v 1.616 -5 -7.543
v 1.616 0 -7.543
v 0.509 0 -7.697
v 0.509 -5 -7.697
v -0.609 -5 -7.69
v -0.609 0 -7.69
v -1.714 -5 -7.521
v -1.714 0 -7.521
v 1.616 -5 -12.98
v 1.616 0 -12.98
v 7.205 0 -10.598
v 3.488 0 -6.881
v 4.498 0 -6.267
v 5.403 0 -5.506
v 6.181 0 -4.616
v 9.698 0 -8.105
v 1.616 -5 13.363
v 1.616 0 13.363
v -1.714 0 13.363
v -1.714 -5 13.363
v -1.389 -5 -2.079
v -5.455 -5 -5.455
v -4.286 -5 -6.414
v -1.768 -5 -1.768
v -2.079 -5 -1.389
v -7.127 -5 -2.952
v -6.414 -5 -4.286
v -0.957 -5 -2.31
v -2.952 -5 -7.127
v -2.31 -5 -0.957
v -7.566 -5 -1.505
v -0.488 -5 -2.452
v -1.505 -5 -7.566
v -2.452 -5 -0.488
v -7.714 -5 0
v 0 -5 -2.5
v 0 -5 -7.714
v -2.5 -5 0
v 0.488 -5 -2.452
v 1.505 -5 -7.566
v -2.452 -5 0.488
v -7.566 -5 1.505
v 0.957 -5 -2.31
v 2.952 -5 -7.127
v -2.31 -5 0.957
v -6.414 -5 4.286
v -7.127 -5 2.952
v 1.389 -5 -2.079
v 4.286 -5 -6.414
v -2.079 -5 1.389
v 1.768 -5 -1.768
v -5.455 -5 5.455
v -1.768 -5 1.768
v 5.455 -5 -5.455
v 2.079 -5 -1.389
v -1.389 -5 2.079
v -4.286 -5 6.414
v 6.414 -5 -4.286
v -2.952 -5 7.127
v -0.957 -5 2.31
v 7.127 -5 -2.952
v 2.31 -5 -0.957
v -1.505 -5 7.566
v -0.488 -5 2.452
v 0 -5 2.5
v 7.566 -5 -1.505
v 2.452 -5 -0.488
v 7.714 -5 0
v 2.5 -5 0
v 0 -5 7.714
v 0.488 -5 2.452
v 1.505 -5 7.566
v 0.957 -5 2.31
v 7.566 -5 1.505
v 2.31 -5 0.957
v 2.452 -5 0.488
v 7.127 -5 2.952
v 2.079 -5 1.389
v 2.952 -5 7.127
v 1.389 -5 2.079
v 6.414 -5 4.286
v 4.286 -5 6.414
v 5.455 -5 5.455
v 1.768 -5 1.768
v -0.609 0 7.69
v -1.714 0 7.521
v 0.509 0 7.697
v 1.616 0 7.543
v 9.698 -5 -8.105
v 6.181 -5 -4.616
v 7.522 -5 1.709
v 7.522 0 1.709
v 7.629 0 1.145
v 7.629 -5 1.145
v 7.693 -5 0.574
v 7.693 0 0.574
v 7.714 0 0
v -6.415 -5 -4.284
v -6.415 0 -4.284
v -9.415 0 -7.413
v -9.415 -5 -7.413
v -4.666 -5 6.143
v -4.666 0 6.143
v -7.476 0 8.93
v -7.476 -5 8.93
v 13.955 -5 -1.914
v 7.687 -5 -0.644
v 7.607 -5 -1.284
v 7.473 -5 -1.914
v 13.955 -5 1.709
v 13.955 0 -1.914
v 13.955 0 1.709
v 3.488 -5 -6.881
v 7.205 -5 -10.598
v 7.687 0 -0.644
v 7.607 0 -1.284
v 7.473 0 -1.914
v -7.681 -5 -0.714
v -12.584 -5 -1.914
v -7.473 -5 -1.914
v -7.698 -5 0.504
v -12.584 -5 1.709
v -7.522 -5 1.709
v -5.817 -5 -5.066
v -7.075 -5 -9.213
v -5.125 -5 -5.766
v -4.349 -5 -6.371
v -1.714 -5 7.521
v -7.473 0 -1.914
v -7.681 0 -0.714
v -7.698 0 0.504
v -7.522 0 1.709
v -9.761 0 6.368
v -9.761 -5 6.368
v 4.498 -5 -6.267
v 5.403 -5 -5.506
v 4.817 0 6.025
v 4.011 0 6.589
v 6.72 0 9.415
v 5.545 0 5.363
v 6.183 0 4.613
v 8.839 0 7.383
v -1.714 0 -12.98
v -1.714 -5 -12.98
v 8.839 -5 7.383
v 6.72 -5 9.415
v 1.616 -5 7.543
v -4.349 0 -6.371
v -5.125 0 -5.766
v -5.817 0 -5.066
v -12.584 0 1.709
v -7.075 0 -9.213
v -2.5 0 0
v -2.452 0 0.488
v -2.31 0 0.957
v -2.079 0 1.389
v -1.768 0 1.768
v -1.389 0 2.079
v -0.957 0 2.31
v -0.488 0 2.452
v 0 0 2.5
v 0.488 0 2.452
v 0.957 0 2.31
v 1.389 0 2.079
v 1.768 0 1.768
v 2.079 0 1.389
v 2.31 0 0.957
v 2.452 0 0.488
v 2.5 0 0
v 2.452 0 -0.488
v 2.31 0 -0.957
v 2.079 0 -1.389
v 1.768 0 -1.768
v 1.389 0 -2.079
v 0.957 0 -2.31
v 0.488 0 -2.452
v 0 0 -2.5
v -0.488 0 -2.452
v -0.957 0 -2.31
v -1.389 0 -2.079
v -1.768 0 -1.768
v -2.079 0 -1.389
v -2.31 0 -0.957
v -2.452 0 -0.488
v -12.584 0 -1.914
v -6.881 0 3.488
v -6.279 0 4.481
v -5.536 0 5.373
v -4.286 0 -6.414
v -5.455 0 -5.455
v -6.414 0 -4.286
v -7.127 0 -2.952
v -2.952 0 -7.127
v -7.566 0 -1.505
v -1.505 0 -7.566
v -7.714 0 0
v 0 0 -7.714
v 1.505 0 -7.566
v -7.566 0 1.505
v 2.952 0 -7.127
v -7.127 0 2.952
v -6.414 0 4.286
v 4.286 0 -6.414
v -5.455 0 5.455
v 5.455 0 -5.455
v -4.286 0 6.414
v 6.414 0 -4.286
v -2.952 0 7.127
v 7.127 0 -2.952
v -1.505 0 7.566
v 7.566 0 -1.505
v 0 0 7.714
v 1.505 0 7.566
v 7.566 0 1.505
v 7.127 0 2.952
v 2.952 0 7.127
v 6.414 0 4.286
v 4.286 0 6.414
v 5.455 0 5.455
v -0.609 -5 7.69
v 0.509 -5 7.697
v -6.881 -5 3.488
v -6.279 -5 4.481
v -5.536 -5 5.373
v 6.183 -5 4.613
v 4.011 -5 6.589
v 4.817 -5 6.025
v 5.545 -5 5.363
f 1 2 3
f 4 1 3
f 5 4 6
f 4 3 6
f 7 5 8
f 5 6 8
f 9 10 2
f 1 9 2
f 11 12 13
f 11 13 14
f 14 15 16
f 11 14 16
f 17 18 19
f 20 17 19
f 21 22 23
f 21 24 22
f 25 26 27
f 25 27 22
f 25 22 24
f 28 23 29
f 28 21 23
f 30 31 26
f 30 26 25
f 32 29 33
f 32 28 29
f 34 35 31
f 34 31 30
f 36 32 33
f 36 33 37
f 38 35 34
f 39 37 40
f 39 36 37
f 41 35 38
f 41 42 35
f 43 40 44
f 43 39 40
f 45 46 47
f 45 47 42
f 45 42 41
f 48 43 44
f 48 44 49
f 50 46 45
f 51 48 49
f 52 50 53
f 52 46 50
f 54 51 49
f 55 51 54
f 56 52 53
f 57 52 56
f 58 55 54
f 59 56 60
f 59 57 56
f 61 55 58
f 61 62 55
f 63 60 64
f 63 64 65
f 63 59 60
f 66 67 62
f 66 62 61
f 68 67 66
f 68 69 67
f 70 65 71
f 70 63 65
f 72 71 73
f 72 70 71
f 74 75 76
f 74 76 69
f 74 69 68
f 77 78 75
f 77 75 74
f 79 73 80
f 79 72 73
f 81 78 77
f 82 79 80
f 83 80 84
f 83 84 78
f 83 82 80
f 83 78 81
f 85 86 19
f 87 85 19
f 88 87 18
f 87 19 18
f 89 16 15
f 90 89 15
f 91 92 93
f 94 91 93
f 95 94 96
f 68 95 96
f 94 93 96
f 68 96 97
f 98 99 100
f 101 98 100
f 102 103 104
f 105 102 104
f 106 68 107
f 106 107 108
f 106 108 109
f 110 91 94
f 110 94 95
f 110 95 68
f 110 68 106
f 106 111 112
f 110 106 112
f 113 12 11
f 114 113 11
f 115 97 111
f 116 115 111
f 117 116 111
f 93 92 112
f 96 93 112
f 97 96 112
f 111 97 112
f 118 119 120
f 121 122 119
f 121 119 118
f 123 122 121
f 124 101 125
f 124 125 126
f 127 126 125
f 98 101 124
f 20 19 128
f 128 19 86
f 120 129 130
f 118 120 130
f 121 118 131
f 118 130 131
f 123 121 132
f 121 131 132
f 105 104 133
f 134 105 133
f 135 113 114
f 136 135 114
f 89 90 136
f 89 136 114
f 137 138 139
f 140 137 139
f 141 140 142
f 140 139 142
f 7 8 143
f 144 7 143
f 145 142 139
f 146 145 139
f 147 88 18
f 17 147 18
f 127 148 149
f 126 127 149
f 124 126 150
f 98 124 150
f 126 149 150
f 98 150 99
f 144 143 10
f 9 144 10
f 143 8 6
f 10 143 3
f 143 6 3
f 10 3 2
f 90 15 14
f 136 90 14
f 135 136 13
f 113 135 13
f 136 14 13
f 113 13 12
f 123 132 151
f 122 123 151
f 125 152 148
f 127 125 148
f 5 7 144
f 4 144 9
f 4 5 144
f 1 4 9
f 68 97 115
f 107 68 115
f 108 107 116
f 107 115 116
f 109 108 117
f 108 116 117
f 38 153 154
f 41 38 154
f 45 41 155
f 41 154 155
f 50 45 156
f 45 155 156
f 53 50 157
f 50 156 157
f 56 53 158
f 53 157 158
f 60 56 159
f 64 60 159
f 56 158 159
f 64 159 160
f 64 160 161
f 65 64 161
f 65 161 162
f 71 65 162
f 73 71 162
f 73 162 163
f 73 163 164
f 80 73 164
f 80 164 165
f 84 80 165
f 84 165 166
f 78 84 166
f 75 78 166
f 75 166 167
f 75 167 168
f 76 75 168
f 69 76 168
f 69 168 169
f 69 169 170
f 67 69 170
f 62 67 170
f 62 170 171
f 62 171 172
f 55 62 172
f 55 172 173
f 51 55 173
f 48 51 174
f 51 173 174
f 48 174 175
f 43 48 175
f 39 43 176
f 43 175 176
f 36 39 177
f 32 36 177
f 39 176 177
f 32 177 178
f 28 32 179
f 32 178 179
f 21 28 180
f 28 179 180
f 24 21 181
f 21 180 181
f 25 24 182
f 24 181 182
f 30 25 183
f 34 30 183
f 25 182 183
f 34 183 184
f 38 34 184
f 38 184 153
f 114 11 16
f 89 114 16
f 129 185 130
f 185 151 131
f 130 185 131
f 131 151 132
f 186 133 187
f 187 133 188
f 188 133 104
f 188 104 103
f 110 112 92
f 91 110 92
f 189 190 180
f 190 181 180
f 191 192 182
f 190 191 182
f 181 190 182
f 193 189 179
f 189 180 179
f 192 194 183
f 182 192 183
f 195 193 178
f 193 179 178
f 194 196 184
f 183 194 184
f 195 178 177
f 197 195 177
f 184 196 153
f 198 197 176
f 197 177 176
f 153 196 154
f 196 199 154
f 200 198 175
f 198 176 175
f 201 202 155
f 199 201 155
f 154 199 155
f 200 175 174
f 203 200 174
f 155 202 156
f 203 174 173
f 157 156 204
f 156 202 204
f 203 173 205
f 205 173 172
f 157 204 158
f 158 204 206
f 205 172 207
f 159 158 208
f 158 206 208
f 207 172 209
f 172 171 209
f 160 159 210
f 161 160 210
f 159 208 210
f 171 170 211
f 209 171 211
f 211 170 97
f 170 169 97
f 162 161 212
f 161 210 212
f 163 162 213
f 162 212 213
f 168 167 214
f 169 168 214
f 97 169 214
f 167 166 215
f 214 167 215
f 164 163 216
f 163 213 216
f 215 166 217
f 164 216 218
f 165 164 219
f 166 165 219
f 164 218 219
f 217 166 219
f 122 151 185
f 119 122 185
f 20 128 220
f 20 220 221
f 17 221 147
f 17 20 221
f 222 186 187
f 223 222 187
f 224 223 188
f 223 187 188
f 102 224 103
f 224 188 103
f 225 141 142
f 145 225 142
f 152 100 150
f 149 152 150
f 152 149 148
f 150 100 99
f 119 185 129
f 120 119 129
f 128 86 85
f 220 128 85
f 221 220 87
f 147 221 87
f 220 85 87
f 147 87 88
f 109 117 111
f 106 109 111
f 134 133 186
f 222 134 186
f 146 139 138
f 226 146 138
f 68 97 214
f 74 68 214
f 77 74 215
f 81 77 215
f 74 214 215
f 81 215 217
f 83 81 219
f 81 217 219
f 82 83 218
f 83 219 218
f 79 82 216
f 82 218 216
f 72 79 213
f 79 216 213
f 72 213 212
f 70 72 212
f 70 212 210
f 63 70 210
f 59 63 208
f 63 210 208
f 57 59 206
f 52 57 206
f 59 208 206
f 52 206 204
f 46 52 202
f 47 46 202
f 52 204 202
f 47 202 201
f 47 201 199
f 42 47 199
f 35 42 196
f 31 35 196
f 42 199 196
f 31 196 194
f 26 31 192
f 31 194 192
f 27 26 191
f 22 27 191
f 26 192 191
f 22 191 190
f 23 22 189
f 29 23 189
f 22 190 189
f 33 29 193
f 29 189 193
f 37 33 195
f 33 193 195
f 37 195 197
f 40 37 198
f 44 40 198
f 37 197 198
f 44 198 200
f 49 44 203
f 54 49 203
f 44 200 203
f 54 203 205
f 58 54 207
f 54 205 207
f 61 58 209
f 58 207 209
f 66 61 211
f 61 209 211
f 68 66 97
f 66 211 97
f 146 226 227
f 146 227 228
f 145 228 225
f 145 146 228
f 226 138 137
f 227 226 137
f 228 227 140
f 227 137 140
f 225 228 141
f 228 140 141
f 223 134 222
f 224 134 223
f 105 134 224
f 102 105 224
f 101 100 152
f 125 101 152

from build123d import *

# Parameters (mm, degrees)
F0_R     = 7.7142389087
F5_DEPTH = 5
F7_D     = 5


with BuildPart() as f5:
    # F0 (on Front) → F5 (new body)
    with BuildSketch(Plane.XZ):
        Circle(F0_R)
    extrude(amount=F5_DEPTH)

    # F7 (through all)
    with Locations(Plane.XZ.offset(5)):
        with Locations((0, 0)):
            Hole(F7_D / 2)


with BuildPart() as f5b:
    # F4 (on face) → F5, piece 2 (new body)
    with BuildSketch(Plane.XZ):
        with BuildLine():
            Line((-6.4151013281, -4.2843852407), (-9.4147128984, -7.4127353728))
            Line((-9.4147128984, -7.4127353728), (-7.0748222597, -9.2134878601))
            Line((-7.0748222597, -9.2134878601), (-4.349461512, -6.3711589602))
            ThreePointArc((-4.349461512, -6.3711589602), (-5.4824820495, -5.4269579431), (-6.4151013281, -4.2843852407))
        make_face()
    extrude(amount=F5_DEPTH)


with BuildPart() as f5c:
    # F4 (on face) → F5, piece 3 (new body)
    with BuildSketch(Plane.XZ):
        with BuildLine():
            Line((6.7200716585, 9.4145284966), (4.0111821729, 6.5893777791))
            ThreePointArc((4.0111821729, 6.5893777791), (5.191915124, 5.7055673938), (6.1828679139, 4.6132013071))
            Line((6.1828679139, 4.6132013071), (8.838734437, 7.3830534008))
            Line((8.838734437, 7.3830534008), (6.7200716585, 9.4145284966))
        make_face()
    extrude(amount=F5_DEPTH)


with BuildPart() as f5d:
    # F2 (on face) → F5, piece 4 (new body)
    with BuildSketch(Plane.XZ):
        with BuildLine():
            Line((-7.5224605391, 1.7094061477), (-12.5843221322, 1.7094061477))
            Line((-12.5843221322, 1.7094061477), (-12.5843221322, -1.9140576478))
            Line((-12.5843221322, -1.9140576478), (-7.4730091169, -1.9140576478))
            ThreePointArc((-7.4730091169, -1.9140576478), (-7.7135205983, -0.1052706983), (-7.5224605391, 1.7094061477))
        make_face()
    extrude(amount=F5_DEPTH)


with BuildPart() as f5e:
    # F2 (on face) → F5, piece 5 (new body)
    with BuildSketch(Plane.XZ):
        with BuildLine():
            Line((13.9551013708, 1.7094061477), (7.5224605391, 1.7094061477))
            ThreePointArc((7.5224605391, 1.7094061477), (7.6661443934, 0.8600651604), (7.7142389087, 0))
            ThreePointArc((7.7142389087, 0), (7.6536938675, -0.9645994624), (7.4730091169, -1.9140576478))
            Line((7.4730091169, -1.9140576478), (13.9551013708, -1.9140576478))
            Line((13.9551013708, -1.9140576478), (13.9551013708, 1.7094061477))
        make_face()
    extrude(amount=F5_DEPTH)


with BuildPart() as f5f:
    # F3 (on face) → F5, piece 6 (new body)
    with BuildSketch(Plane.XZ):
        with BuildLine():
            Line((-7.475768216, 8.9297927916), (-9.7609516233, 6.3676163554))
            Line((-9.7609516233, 6.3676163554), (-6.8808801981, 3.4875449302))
            ThreePointArc((-6.8808801981, 3.4875449302), (-5.9242567565, 4.9409173059), (-4.6662492185, 6.1429309105))
            Line((-4.6662492185, 6.1429309105), (-7.475768216, 8.9297927916))
        make_face()
    extrude(amount=F5_DEPTH)


with BuildPart() as f5g:
    # F3 (on face) → F5, piece 7 (new body)
    with BuildSketch(Plane.XZ):
        with BuildLine():
            ThreePointArc((6.1805118227, -4.6163573898), (4.9648611492, -5.9042049176), (3.4875449302, -6.8808801981))
            Line((3.4875449302, -6.8808801981), (7.2048073635, -10.5981426314))
            Line((7.2048073635, -10.5981426314), (9.6977343783, -8.1052156165))
            Line((9.6977343783, -8.1052156165), (6.1805118227, -4.6163573898))
        make_face()
    extrude(amount=F5_DEPTH)


with BuildPart() as f5h:
    # F1 (on face) → F5, piece 8 (new body)
    with BuildSketch(Plane.XZ):
        with BuildLine():
            Line((1.6157386126, 13.3632495999), (-1.7139305128, 13.3632495999))
            Line((-1.7139305128, 13.3632495999), (-1.7139305128, 7.52143099))
            ThreePointArc((-1.7139305128, 7.52143099), (-0.0502808867, 7.7140750432), (1.6157386126, 7.5431340089))
            Line((1.6157386126, 7.5431340089), (1.6157386126, 13.3632495999))
        make_face()
    extrude(amount=F5_DEPTH)


with BuildPart() as f5i:
    # F1 (on face) → F5, piece 9 (new body)
    with BuildSketch(Plane.XZ):
        with BuildLine():
            ThreePointArc((1.6157386126, -7.5431340089), (-0.0502808867, -7.7140750432), (-1.7139305128, -7.52143099))
            Line((-1.7139305128, -7.52143099), (-1.7139305128, -12.980312109))
            Line((-1.7139305128, -12.980312109), (1.6157386126, -12.980312109))
            Line((1.6157386126, -12.980312109), (1.6157386126, -7.5431340089))
        make_face()
    extrude(amount=F5_DEPTH)


solid = Compound([f5.part, f5b.part, f5c.part, f5d.part, f5e.part, f5f.part, f5g.part, f5h.part, f5i.part])
